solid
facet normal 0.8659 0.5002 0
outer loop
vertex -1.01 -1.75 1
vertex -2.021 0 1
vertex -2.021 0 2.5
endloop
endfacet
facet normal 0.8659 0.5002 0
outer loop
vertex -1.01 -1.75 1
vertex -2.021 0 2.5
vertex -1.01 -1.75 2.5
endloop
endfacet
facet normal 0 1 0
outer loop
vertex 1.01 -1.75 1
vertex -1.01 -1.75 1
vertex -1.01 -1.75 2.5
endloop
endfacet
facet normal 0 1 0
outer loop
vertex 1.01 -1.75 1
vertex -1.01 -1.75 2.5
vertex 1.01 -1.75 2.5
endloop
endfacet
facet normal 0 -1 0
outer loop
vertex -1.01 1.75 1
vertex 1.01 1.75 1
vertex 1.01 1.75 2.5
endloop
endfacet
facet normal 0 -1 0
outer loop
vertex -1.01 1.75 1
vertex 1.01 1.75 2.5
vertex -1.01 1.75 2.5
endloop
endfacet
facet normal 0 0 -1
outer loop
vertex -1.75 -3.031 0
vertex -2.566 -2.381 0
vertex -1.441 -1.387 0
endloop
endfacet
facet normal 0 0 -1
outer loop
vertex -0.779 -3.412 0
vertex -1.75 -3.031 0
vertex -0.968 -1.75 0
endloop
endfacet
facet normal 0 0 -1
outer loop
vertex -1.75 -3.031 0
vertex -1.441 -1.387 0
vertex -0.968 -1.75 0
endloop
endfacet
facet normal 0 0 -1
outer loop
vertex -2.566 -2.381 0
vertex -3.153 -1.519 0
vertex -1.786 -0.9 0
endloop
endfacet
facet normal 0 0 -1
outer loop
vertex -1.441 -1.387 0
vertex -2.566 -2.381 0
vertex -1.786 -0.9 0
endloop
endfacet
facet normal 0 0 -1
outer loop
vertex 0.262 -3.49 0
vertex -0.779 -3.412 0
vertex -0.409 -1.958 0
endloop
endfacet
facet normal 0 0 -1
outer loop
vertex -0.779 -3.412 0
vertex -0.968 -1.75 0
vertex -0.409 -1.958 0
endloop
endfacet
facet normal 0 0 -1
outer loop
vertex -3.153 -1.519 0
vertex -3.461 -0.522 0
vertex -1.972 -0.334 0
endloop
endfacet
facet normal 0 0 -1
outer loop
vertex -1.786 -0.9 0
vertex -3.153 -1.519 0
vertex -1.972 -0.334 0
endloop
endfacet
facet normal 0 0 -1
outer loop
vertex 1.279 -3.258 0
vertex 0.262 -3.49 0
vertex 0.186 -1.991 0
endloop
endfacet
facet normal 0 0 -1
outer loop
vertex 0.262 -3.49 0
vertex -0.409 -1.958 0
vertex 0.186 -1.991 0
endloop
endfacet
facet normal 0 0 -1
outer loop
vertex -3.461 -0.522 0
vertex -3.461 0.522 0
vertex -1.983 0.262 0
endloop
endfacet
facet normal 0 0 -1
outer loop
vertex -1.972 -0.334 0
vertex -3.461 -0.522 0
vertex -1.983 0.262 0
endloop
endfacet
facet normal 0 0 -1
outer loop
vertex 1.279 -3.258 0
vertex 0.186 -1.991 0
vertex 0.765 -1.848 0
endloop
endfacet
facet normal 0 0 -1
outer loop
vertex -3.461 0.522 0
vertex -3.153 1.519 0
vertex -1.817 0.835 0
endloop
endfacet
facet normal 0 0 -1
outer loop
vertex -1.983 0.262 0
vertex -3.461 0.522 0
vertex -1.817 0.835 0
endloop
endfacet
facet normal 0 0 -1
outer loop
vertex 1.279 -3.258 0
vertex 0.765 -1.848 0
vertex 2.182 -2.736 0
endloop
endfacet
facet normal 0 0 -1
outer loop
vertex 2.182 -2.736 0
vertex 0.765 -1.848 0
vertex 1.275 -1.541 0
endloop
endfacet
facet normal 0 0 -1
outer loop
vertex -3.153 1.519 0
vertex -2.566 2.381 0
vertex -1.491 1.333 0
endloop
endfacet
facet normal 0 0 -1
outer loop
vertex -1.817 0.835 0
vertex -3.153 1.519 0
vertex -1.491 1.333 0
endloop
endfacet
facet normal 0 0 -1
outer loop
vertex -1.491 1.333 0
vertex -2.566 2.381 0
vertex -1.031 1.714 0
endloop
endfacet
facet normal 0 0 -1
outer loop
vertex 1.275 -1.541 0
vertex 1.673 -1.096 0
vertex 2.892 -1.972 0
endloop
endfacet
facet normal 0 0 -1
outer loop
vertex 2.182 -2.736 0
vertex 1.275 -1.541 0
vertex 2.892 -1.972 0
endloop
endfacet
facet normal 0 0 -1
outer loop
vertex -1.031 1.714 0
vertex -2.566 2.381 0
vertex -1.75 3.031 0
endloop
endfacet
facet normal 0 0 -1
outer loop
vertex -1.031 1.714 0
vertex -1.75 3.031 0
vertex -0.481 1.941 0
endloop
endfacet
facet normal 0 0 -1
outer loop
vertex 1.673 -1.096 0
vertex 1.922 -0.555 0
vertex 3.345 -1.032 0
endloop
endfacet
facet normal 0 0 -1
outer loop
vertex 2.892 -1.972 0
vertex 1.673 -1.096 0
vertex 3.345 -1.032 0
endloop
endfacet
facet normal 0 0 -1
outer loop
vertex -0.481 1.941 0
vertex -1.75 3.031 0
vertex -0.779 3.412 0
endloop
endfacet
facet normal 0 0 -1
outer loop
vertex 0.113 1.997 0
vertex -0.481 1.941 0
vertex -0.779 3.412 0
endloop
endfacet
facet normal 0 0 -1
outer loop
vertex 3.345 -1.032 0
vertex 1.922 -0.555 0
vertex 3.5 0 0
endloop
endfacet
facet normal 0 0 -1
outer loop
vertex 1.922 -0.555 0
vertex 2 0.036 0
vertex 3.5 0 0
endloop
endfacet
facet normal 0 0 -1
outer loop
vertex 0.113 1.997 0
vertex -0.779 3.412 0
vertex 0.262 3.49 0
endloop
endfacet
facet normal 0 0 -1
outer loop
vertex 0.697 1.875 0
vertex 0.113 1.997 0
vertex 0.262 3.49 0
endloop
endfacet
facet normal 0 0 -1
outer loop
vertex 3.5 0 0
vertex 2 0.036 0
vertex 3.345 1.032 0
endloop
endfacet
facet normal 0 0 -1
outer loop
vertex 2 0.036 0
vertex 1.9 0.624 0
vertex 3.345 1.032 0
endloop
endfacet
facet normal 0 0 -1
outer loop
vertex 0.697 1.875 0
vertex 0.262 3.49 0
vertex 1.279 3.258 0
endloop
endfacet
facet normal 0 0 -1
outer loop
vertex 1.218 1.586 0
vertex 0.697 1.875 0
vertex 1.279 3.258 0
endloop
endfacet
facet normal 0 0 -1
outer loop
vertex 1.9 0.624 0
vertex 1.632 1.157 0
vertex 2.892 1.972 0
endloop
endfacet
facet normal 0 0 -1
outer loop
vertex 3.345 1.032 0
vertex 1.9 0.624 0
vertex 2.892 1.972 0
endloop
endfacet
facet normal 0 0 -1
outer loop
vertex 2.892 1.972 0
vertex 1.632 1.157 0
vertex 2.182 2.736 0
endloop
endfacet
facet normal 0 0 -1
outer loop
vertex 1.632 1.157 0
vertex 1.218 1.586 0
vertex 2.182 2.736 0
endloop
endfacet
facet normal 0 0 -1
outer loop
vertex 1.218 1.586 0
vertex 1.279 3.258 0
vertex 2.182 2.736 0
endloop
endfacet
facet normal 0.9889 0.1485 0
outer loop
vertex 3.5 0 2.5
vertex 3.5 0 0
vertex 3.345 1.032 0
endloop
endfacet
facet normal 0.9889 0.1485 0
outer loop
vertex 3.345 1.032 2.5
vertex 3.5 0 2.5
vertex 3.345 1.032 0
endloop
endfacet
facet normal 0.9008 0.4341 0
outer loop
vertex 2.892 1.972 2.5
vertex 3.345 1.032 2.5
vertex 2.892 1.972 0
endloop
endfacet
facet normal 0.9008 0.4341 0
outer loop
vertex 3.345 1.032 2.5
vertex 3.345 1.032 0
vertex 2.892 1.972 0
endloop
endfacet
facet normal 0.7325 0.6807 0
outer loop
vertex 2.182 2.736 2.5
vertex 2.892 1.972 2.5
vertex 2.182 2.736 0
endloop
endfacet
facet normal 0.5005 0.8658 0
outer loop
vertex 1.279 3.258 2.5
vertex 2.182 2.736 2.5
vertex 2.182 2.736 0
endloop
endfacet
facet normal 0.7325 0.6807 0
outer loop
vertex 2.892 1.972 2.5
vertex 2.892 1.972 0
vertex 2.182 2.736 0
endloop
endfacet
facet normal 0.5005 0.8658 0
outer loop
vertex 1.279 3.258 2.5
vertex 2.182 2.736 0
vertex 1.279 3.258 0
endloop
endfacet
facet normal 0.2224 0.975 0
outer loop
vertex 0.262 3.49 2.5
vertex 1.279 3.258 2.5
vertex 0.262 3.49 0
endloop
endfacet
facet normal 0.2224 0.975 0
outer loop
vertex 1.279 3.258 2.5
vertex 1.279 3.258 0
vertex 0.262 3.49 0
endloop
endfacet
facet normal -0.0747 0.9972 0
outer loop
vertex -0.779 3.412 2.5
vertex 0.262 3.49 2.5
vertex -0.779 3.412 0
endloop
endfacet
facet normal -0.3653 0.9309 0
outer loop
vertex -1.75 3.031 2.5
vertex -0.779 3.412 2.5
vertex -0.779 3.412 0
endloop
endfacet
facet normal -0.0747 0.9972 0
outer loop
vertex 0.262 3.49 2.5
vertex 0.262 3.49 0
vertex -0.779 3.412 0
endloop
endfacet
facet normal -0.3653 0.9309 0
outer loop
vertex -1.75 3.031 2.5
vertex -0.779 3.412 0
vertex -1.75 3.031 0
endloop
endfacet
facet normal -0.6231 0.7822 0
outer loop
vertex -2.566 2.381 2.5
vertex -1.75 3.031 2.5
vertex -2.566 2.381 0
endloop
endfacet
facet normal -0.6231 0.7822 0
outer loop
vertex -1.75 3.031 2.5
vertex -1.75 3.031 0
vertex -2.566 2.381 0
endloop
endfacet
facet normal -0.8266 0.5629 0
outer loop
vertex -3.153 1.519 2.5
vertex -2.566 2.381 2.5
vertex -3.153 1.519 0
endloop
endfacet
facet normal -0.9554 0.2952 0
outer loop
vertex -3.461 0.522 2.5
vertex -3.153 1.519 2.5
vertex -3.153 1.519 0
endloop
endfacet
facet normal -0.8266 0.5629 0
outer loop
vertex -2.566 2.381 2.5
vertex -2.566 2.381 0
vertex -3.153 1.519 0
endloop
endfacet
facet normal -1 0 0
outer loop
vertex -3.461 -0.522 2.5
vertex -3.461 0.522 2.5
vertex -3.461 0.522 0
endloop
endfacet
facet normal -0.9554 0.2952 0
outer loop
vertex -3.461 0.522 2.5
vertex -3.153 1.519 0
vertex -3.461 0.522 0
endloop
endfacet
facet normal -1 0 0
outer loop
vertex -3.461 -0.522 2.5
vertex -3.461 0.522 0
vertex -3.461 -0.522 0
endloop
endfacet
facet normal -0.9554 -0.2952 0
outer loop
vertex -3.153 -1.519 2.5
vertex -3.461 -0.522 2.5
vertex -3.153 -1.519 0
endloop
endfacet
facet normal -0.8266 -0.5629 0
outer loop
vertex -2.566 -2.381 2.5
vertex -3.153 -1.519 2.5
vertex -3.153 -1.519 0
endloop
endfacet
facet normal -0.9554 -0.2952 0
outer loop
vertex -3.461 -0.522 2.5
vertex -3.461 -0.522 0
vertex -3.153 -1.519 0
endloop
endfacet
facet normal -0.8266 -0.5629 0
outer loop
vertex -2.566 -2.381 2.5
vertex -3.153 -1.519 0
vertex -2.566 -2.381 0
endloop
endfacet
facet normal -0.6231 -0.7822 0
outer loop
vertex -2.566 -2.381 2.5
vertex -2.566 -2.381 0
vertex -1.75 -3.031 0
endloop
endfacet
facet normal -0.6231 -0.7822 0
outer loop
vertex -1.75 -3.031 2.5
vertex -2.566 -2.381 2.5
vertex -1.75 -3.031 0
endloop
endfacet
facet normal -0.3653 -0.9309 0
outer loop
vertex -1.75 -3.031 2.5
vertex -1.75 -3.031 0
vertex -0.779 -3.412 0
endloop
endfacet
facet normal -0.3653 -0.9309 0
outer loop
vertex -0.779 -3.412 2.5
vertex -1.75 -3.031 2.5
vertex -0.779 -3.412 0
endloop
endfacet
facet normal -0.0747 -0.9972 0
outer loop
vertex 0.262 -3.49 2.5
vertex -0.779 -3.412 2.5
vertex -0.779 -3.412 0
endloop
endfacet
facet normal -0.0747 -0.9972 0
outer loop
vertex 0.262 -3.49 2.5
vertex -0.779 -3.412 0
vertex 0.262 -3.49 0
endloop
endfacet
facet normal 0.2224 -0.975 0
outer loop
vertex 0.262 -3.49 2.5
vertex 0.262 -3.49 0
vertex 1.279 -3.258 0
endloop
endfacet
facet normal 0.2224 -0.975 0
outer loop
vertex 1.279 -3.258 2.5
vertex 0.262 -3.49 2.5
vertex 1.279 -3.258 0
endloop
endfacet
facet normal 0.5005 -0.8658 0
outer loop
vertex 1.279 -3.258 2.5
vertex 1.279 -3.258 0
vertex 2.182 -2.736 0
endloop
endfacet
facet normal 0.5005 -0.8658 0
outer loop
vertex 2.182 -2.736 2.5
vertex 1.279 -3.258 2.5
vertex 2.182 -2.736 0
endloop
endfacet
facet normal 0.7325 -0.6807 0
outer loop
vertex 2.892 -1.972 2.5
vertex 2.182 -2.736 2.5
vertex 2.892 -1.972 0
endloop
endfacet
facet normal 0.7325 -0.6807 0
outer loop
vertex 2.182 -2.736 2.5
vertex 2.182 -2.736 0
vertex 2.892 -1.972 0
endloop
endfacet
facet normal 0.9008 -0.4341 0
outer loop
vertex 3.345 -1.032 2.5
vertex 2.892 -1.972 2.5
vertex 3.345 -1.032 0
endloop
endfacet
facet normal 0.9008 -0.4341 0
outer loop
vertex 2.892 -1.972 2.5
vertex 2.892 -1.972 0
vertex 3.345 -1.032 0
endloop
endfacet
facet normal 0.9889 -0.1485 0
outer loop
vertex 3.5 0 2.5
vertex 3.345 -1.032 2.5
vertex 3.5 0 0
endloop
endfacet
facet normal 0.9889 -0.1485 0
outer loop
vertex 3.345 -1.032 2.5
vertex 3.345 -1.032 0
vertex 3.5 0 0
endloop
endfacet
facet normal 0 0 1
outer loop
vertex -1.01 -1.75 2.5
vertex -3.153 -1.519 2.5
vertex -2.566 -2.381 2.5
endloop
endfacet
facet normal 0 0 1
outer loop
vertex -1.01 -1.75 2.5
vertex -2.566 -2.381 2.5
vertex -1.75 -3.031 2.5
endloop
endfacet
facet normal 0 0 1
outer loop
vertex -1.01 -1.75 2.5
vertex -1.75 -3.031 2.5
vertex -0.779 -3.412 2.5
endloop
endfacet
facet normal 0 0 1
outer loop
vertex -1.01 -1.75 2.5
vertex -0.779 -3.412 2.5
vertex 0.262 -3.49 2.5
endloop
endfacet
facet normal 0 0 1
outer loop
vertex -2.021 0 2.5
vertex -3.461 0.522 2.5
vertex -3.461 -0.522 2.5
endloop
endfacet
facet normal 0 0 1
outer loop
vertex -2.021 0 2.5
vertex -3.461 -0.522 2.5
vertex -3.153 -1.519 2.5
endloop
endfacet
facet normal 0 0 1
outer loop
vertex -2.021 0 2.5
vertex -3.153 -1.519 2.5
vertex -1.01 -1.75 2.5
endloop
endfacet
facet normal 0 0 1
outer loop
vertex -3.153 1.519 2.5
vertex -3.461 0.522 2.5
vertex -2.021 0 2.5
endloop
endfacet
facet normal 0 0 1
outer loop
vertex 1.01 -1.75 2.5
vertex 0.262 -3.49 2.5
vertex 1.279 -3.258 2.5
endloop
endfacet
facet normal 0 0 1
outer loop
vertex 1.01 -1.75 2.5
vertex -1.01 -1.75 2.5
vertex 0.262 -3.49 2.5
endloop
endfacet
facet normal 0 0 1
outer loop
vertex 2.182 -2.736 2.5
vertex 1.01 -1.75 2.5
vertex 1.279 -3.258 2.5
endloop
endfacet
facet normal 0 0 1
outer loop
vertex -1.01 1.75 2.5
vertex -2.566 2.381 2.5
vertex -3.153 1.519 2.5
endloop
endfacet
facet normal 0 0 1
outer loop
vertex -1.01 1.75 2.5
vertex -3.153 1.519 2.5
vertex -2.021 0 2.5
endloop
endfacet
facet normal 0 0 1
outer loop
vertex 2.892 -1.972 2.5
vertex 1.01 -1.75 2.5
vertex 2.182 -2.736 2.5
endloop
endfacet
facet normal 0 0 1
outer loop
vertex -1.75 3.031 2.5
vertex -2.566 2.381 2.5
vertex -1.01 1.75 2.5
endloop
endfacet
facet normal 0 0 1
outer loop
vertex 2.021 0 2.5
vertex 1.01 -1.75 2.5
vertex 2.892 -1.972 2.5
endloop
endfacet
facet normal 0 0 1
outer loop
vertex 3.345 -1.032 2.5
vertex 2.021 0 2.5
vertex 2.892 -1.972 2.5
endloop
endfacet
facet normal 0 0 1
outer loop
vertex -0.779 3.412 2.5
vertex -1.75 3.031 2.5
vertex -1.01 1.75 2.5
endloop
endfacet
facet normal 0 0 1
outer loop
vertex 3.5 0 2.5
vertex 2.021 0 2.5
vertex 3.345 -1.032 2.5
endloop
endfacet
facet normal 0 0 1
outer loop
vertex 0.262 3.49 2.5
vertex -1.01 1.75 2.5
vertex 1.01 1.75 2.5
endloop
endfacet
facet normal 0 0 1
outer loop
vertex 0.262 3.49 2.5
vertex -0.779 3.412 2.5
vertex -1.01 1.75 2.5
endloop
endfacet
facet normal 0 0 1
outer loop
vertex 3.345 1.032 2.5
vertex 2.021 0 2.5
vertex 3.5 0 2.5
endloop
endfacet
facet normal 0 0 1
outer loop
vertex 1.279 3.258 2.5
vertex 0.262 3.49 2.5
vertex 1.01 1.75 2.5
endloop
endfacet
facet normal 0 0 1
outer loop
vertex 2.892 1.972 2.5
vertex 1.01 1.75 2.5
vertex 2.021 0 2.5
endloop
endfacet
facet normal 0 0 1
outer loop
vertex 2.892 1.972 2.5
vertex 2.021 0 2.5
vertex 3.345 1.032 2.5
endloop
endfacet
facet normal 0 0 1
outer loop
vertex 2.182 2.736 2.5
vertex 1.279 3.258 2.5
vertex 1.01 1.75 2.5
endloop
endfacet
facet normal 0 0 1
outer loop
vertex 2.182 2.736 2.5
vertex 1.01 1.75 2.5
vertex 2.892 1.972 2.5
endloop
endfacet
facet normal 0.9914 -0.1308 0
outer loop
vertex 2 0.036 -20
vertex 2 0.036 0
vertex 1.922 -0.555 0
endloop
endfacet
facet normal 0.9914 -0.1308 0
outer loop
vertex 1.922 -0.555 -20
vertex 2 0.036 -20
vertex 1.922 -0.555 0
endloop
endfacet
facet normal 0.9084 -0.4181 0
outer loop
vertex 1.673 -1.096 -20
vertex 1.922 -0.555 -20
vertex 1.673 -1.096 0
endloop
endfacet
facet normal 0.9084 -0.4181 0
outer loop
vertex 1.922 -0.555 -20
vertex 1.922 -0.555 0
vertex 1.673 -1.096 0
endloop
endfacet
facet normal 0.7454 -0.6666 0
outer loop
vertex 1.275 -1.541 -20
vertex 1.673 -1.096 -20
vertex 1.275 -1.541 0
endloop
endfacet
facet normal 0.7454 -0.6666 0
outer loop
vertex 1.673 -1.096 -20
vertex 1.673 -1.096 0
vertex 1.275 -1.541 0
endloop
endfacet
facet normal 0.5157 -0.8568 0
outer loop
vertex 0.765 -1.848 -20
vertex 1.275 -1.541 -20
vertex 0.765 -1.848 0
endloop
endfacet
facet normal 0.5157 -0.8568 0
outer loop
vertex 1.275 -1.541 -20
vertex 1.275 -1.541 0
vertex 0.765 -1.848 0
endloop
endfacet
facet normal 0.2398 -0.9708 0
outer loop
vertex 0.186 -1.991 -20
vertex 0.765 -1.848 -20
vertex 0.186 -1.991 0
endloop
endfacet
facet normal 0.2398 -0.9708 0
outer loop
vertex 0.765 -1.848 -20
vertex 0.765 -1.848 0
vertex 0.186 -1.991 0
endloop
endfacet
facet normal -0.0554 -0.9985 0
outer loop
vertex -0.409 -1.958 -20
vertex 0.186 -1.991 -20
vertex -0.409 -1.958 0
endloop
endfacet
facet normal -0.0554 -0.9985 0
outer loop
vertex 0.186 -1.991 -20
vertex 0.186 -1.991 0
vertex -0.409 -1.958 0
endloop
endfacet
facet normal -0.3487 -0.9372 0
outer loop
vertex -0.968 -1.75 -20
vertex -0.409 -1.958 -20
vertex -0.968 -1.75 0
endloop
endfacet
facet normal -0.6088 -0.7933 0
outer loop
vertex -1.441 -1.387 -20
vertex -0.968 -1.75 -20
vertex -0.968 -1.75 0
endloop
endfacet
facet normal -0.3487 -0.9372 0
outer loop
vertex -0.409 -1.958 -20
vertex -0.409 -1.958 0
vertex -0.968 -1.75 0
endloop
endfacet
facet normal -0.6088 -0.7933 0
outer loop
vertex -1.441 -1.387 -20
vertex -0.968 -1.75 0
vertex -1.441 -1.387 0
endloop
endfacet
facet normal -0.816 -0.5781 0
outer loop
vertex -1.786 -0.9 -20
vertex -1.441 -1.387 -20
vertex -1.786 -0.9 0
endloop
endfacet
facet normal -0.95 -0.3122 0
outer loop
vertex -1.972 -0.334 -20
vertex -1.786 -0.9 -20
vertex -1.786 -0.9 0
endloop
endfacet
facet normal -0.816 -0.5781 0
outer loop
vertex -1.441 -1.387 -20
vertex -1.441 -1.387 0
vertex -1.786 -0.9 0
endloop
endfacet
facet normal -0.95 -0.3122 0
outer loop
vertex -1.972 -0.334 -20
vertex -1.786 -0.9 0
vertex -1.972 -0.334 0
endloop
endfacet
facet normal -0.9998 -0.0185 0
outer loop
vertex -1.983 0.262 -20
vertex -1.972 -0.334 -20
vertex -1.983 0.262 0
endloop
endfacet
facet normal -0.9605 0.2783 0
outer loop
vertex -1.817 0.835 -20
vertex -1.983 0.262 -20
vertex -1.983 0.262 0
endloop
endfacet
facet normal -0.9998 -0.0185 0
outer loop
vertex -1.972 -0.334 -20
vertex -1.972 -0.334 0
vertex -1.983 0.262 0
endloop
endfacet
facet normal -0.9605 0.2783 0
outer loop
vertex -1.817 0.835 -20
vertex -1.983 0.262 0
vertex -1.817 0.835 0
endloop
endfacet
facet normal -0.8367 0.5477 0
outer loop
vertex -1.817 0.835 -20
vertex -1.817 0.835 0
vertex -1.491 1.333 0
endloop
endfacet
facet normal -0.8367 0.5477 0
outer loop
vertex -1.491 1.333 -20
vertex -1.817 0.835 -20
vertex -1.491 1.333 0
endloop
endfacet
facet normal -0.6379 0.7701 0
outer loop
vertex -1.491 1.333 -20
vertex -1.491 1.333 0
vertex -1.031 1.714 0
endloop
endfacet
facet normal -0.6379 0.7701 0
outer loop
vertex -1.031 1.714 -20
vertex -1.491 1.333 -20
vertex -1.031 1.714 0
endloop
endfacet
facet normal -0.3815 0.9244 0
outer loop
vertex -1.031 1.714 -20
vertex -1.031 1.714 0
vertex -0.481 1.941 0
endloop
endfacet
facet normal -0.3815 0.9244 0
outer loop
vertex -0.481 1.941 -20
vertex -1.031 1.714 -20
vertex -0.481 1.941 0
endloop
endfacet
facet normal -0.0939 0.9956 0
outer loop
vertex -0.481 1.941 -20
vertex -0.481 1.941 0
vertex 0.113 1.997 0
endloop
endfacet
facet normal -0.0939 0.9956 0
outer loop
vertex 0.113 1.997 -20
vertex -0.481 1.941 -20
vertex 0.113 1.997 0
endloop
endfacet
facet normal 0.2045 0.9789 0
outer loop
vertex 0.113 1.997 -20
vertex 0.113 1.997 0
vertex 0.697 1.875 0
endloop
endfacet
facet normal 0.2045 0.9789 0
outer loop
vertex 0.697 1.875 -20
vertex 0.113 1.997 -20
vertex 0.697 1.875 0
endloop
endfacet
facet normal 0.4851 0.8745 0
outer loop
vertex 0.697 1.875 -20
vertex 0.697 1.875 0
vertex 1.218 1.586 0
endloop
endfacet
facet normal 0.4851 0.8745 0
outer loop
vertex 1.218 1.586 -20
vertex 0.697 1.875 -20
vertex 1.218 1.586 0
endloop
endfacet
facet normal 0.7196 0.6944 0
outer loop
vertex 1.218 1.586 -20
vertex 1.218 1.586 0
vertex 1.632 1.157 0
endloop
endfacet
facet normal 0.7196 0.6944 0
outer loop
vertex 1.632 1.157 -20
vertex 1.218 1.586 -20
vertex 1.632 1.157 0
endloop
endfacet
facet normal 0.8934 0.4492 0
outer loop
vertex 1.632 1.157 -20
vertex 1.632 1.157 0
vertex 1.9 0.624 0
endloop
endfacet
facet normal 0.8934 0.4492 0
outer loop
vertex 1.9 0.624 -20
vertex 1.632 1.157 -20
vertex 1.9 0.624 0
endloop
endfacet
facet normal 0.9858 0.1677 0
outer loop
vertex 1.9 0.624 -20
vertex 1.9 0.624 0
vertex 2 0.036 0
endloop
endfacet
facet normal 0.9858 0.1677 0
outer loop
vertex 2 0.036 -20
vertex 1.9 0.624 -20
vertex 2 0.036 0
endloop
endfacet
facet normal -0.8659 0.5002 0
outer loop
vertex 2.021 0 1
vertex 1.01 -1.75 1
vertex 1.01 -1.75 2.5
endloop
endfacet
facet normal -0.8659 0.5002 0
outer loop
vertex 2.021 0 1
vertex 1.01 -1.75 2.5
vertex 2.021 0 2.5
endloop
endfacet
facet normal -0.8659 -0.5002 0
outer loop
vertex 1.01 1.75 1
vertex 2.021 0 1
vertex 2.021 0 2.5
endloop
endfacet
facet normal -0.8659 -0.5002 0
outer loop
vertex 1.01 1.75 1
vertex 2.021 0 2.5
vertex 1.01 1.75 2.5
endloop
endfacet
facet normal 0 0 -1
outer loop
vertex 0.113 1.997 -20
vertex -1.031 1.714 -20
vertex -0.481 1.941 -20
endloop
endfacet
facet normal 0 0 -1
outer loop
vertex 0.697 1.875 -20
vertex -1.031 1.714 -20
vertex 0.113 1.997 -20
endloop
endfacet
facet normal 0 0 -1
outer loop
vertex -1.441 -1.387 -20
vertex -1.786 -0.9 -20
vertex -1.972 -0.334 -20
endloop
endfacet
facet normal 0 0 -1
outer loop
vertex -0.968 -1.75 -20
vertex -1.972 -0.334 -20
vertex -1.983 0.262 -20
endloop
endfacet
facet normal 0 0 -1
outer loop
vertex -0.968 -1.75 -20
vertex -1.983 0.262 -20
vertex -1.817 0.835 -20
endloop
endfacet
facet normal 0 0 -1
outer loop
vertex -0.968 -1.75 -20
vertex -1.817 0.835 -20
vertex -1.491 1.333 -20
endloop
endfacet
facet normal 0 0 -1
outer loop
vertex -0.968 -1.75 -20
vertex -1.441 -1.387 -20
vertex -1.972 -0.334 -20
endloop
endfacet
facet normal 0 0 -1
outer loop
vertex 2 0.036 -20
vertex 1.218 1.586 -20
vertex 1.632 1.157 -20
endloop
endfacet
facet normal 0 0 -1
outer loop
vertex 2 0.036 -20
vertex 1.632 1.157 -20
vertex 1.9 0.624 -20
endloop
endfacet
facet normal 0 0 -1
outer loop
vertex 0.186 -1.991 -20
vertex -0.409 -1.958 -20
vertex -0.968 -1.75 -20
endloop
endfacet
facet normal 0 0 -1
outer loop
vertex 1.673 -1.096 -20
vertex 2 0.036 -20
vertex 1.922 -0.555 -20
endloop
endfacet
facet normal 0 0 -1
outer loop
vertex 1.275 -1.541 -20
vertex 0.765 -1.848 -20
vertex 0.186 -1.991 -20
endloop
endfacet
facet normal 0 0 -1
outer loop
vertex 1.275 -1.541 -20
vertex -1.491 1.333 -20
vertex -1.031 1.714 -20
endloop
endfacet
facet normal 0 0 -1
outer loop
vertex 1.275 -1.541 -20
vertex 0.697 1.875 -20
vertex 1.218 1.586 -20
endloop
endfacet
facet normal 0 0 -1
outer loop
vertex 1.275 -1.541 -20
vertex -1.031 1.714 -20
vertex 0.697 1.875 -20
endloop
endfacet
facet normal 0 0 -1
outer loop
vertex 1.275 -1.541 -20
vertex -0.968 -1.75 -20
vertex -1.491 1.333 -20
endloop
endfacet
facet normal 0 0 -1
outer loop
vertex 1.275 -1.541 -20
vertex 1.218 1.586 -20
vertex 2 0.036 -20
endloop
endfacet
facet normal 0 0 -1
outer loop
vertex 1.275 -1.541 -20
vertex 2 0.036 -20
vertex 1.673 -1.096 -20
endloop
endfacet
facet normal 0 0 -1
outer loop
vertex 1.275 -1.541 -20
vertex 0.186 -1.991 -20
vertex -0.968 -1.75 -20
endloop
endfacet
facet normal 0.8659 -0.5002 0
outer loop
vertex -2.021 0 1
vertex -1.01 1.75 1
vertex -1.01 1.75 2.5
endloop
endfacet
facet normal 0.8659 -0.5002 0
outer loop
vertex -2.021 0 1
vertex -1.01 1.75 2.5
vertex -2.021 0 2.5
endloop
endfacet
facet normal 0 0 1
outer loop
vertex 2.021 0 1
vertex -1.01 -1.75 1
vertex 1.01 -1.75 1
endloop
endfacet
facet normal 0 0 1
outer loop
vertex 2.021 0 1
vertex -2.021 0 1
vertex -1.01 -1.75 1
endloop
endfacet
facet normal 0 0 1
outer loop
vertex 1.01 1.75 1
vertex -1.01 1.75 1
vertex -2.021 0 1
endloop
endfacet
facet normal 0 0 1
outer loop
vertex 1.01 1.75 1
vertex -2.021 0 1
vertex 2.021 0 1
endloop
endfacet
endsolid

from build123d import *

# Parameters (mm, degrees)
SKETCH_1_R      = 3.5
EXTRUDE_1_DEPTH = 2.5
SKETCH_2_R      = 2
EXTRUDE_2_DEPTH = 20
EXTRUDE_3_DEPTH = 1


with BuildPart() as part:
    # 草图1 → 凸台-拉伸1 (new body)
    with BuildSketch(Plane.XY):
        Circle(SKETCH_1_R)
        Polygon((2.020725942, 0), (1.010362971, 1.75), (-1.010362971, 1.75), (-2.020725942, 0), (-1.010362971, -1.75), (1.010362971, -1.75), align=None, mode=Mode.SUBTRACT)
    extrude(amount=EXTRUDE_1_DEPTH)

    # 草图2 → 凸台-拉伸2 (add)
    with BuildSketch(Plane(origin=(0, 0, 0), x_dir=(-1, 0, 0), z_dir=(0, 0, -1))):
        with Locations(Location((0, 0, 0), (0, 0, 178.955024372))):
            Circle(SKETCH_2_R)
    extrude(amount=EXTRUDE_2_DEPTH)

    # 草图1<3> → 凸台-拉伸3 (add)
    with BuildSketch(Plane.XY):
        Polygon((-1.010362971, -1.75), (1.010362971, -1.75), (2.020725942, 0), (1.010362971, 1.75), (-1.010362971, 1.75), (-2.020725942, 0), align=None)
    extrude(amount=EXTRUDE_3_DEPTH)


solid = part.part
